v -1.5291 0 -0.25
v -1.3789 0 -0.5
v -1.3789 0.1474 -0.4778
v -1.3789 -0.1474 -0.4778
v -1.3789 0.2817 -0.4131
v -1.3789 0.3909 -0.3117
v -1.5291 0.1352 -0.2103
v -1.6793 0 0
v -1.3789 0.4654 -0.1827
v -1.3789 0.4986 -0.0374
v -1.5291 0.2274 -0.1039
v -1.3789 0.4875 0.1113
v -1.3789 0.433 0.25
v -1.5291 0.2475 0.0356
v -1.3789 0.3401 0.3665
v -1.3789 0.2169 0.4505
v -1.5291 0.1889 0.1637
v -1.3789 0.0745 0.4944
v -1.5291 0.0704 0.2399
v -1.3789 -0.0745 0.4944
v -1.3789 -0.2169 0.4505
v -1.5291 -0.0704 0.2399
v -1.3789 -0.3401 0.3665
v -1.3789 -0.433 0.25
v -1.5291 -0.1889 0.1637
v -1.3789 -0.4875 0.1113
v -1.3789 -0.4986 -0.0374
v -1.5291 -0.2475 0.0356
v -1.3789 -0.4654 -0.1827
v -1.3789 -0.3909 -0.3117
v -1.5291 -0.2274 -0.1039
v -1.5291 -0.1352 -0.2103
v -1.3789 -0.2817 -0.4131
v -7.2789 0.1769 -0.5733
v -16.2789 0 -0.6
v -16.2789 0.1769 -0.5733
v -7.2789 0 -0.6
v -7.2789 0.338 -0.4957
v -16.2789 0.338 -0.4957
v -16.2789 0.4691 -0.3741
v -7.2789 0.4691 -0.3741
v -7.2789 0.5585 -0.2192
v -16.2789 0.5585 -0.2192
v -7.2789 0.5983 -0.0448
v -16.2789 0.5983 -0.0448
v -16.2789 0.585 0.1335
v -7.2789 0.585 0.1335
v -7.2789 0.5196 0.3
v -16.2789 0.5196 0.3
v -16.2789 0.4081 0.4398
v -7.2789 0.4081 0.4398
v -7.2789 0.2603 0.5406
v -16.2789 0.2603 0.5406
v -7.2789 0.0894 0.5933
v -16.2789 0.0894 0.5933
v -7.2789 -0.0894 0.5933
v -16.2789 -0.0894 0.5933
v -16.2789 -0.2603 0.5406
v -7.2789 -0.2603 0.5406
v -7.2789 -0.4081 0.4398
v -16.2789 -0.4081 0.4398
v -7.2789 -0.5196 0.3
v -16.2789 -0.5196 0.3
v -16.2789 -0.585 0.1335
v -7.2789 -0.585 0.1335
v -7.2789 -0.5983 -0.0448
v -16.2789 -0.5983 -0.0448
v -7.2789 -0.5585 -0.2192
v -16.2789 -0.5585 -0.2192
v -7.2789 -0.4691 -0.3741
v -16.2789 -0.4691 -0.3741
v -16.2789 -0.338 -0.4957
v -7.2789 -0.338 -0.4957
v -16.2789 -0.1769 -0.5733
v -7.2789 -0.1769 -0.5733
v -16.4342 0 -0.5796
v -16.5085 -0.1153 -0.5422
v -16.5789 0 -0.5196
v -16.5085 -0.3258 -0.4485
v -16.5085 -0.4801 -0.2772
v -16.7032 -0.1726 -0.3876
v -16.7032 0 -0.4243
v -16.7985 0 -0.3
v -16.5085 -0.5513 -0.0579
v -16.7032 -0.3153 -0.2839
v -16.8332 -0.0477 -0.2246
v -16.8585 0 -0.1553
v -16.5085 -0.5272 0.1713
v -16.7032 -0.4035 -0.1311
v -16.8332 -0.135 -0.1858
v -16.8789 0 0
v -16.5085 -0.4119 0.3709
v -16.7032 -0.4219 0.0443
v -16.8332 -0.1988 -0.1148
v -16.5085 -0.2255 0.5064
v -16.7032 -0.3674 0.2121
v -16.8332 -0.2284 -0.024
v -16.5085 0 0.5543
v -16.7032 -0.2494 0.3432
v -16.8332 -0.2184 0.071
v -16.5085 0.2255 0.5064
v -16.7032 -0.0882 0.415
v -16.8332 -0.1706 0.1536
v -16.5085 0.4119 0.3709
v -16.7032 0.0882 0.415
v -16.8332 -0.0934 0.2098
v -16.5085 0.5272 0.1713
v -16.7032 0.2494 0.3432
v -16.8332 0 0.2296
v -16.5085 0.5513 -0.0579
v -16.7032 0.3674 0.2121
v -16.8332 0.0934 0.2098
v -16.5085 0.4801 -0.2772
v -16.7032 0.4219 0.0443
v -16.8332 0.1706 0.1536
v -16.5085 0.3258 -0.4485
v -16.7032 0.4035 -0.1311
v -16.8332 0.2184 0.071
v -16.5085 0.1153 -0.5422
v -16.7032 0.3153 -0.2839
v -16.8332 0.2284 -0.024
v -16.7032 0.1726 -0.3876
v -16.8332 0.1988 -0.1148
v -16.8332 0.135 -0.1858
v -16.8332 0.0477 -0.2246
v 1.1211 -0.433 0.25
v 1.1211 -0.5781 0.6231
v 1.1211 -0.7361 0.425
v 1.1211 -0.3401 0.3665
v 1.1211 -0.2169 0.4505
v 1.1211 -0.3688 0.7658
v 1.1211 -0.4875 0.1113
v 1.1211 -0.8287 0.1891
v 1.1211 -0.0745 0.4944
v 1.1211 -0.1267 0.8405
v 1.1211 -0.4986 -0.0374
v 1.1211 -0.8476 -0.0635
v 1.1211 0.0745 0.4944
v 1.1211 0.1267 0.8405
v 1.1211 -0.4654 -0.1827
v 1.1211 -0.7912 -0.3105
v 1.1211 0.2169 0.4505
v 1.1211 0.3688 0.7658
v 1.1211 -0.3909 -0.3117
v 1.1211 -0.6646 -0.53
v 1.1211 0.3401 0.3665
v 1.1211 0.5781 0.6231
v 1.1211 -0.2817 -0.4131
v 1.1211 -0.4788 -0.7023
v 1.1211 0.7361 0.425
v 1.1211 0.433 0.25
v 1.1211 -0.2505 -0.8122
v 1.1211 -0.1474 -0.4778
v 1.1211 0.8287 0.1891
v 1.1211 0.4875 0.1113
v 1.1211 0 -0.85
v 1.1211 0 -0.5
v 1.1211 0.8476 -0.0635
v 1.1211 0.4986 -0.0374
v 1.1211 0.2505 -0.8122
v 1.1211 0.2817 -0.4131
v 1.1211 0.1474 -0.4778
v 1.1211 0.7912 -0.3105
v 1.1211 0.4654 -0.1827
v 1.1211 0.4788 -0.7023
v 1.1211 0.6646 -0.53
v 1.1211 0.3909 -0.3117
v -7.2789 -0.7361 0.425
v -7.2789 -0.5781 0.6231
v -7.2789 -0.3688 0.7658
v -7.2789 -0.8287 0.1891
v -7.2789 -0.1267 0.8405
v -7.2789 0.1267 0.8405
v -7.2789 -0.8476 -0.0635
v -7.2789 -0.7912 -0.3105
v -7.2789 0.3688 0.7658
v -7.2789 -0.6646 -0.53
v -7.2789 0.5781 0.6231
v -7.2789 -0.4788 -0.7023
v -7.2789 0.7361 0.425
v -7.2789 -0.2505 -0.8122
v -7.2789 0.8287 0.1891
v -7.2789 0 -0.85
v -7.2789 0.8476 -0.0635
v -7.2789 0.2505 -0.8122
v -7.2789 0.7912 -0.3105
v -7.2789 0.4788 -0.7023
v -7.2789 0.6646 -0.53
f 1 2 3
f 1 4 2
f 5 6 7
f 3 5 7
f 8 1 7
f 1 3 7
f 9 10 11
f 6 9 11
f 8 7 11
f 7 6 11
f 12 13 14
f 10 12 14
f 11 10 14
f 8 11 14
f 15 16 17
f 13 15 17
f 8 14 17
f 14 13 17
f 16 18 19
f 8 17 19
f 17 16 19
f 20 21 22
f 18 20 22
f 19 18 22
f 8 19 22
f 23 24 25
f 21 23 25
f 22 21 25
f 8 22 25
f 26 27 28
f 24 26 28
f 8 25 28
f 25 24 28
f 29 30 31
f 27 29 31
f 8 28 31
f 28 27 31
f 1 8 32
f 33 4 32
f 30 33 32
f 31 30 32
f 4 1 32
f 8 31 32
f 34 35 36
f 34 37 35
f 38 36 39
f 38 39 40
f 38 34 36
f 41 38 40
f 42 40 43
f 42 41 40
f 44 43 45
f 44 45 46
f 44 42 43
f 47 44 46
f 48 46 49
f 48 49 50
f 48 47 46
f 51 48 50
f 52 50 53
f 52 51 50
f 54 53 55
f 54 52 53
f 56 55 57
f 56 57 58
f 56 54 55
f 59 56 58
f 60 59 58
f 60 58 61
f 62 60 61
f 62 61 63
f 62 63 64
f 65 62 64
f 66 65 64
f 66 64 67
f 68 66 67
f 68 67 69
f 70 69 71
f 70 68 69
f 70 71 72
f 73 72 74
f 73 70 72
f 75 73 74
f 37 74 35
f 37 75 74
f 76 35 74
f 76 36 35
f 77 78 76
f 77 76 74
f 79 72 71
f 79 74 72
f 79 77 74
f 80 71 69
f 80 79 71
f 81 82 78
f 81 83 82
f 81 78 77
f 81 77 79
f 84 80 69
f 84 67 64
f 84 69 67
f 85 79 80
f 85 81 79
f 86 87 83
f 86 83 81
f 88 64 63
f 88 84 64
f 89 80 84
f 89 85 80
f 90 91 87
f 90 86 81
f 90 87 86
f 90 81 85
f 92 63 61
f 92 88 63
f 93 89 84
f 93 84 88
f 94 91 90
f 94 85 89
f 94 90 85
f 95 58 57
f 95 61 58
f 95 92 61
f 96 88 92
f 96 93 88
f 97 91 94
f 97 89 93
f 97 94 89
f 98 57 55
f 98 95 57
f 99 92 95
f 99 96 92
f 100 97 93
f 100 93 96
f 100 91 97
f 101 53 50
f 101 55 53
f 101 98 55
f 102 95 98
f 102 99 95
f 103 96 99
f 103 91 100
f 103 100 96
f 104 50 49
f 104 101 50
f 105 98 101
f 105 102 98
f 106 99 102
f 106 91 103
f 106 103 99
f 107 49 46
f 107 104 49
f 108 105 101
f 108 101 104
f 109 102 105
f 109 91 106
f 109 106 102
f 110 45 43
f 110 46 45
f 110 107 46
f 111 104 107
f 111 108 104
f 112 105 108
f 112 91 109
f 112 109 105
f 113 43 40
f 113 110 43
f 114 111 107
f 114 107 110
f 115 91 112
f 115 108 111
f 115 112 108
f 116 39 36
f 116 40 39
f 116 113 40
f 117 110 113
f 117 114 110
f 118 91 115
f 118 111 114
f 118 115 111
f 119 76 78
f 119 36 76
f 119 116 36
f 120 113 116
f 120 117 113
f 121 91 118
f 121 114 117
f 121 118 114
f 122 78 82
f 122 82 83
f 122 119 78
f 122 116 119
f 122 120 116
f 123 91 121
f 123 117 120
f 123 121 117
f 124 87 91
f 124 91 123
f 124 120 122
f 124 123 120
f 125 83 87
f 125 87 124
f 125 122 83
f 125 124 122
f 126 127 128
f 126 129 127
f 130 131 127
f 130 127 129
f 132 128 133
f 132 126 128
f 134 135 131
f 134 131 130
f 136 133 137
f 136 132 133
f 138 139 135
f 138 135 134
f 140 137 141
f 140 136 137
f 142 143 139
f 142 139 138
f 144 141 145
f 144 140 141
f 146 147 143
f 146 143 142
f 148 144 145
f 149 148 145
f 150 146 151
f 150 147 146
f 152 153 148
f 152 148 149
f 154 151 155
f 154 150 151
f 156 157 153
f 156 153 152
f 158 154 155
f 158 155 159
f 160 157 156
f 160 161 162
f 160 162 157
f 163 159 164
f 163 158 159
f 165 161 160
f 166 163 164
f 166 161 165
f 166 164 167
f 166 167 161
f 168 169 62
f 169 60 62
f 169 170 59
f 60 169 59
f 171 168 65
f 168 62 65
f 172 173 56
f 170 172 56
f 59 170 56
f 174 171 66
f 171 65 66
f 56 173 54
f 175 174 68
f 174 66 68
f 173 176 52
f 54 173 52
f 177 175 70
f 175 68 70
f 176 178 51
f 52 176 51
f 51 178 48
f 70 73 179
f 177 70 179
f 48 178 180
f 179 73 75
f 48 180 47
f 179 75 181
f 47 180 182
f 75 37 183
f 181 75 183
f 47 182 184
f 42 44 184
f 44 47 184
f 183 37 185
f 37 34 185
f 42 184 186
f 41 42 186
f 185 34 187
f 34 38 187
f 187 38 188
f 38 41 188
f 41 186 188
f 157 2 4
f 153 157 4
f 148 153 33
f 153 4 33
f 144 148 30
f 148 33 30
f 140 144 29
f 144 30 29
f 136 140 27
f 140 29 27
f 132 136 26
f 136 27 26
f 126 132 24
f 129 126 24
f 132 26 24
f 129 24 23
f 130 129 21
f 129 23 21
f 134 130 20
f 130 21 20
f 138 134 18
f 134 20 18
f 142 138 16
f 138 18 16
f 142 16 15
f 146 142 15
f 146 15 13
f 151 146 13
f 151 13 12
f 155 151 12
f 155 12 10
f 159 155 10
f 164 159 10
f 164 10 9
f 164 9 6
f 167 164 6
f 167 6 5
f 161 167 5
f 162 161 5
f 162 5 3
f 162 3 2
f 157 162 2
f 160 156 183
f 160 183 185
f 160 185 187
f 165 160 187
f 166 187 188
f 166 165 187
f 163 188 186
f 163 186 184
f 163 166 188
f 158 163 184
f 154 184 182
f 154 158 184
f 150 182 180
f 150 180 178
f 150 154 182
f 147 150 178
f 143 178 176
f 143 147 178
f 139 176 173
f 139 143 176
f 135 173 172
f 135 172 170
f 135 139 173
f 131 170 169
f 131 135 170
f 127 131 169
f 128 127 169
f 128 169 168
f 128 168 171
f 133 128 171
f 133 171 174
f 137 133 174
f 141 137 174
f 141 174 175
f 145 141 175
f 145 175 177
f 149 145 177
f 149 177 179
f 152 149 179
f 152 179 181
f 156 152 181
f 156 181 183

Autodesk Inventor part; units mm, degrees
ref_plane "YZ Plane" through (0, 0, 0) normal (1, 0, 0) x (0, 1, 0)
ref_plane "XZ Plane" through (0, 0, 0) normal (0, 1, 0) x (-1, 0, 0)
ref_plane "XY Plane" through (0, 0, 0) normal (0, 0, 1) x (1, 0, 0)
sketch "Эскиз1" plane through (0, 0, 0) normal (0, 1, 0) x (-1, 0, 0)
  line L0 (16.8789, 0) -> (-16.2789, 0)
  arc A0 (16.2789, -0.6) -> (16.8789, 0) centre (16.2789, 0) ccw
  line L1 (16.2789, -0.6) -> (7.2789, -0.6)
  line L2 (7.2789, -0.6) -> (7.2789, -0.85)
  line L3 (7.2789, -0.85) -> (-1.1211, -0.85)
  line L4 (-1.1211, -0.85) -> (-1.1211, 0)
  point P0 (0, 0)
  point P1 (0, 0)
  dimension "pin_small_rad" = 0.6
  dimension "d1" = 18
  dimension "d2" = 9
  dimension "pin_big_dia" = 1.7
revolve "Вращение1" add sketch "Эскиз1" angle 360 about axis through (-16.8789, 0, 0) along (1, 0, 0)
hole "Отверстие1" at (1.1211, 0, 0) direction (-1, 0, 0) diameter 1 depth 2.5 tip angle 118
properties part number "kls_pin" material "Сталь, нержавеющая, полированная"
